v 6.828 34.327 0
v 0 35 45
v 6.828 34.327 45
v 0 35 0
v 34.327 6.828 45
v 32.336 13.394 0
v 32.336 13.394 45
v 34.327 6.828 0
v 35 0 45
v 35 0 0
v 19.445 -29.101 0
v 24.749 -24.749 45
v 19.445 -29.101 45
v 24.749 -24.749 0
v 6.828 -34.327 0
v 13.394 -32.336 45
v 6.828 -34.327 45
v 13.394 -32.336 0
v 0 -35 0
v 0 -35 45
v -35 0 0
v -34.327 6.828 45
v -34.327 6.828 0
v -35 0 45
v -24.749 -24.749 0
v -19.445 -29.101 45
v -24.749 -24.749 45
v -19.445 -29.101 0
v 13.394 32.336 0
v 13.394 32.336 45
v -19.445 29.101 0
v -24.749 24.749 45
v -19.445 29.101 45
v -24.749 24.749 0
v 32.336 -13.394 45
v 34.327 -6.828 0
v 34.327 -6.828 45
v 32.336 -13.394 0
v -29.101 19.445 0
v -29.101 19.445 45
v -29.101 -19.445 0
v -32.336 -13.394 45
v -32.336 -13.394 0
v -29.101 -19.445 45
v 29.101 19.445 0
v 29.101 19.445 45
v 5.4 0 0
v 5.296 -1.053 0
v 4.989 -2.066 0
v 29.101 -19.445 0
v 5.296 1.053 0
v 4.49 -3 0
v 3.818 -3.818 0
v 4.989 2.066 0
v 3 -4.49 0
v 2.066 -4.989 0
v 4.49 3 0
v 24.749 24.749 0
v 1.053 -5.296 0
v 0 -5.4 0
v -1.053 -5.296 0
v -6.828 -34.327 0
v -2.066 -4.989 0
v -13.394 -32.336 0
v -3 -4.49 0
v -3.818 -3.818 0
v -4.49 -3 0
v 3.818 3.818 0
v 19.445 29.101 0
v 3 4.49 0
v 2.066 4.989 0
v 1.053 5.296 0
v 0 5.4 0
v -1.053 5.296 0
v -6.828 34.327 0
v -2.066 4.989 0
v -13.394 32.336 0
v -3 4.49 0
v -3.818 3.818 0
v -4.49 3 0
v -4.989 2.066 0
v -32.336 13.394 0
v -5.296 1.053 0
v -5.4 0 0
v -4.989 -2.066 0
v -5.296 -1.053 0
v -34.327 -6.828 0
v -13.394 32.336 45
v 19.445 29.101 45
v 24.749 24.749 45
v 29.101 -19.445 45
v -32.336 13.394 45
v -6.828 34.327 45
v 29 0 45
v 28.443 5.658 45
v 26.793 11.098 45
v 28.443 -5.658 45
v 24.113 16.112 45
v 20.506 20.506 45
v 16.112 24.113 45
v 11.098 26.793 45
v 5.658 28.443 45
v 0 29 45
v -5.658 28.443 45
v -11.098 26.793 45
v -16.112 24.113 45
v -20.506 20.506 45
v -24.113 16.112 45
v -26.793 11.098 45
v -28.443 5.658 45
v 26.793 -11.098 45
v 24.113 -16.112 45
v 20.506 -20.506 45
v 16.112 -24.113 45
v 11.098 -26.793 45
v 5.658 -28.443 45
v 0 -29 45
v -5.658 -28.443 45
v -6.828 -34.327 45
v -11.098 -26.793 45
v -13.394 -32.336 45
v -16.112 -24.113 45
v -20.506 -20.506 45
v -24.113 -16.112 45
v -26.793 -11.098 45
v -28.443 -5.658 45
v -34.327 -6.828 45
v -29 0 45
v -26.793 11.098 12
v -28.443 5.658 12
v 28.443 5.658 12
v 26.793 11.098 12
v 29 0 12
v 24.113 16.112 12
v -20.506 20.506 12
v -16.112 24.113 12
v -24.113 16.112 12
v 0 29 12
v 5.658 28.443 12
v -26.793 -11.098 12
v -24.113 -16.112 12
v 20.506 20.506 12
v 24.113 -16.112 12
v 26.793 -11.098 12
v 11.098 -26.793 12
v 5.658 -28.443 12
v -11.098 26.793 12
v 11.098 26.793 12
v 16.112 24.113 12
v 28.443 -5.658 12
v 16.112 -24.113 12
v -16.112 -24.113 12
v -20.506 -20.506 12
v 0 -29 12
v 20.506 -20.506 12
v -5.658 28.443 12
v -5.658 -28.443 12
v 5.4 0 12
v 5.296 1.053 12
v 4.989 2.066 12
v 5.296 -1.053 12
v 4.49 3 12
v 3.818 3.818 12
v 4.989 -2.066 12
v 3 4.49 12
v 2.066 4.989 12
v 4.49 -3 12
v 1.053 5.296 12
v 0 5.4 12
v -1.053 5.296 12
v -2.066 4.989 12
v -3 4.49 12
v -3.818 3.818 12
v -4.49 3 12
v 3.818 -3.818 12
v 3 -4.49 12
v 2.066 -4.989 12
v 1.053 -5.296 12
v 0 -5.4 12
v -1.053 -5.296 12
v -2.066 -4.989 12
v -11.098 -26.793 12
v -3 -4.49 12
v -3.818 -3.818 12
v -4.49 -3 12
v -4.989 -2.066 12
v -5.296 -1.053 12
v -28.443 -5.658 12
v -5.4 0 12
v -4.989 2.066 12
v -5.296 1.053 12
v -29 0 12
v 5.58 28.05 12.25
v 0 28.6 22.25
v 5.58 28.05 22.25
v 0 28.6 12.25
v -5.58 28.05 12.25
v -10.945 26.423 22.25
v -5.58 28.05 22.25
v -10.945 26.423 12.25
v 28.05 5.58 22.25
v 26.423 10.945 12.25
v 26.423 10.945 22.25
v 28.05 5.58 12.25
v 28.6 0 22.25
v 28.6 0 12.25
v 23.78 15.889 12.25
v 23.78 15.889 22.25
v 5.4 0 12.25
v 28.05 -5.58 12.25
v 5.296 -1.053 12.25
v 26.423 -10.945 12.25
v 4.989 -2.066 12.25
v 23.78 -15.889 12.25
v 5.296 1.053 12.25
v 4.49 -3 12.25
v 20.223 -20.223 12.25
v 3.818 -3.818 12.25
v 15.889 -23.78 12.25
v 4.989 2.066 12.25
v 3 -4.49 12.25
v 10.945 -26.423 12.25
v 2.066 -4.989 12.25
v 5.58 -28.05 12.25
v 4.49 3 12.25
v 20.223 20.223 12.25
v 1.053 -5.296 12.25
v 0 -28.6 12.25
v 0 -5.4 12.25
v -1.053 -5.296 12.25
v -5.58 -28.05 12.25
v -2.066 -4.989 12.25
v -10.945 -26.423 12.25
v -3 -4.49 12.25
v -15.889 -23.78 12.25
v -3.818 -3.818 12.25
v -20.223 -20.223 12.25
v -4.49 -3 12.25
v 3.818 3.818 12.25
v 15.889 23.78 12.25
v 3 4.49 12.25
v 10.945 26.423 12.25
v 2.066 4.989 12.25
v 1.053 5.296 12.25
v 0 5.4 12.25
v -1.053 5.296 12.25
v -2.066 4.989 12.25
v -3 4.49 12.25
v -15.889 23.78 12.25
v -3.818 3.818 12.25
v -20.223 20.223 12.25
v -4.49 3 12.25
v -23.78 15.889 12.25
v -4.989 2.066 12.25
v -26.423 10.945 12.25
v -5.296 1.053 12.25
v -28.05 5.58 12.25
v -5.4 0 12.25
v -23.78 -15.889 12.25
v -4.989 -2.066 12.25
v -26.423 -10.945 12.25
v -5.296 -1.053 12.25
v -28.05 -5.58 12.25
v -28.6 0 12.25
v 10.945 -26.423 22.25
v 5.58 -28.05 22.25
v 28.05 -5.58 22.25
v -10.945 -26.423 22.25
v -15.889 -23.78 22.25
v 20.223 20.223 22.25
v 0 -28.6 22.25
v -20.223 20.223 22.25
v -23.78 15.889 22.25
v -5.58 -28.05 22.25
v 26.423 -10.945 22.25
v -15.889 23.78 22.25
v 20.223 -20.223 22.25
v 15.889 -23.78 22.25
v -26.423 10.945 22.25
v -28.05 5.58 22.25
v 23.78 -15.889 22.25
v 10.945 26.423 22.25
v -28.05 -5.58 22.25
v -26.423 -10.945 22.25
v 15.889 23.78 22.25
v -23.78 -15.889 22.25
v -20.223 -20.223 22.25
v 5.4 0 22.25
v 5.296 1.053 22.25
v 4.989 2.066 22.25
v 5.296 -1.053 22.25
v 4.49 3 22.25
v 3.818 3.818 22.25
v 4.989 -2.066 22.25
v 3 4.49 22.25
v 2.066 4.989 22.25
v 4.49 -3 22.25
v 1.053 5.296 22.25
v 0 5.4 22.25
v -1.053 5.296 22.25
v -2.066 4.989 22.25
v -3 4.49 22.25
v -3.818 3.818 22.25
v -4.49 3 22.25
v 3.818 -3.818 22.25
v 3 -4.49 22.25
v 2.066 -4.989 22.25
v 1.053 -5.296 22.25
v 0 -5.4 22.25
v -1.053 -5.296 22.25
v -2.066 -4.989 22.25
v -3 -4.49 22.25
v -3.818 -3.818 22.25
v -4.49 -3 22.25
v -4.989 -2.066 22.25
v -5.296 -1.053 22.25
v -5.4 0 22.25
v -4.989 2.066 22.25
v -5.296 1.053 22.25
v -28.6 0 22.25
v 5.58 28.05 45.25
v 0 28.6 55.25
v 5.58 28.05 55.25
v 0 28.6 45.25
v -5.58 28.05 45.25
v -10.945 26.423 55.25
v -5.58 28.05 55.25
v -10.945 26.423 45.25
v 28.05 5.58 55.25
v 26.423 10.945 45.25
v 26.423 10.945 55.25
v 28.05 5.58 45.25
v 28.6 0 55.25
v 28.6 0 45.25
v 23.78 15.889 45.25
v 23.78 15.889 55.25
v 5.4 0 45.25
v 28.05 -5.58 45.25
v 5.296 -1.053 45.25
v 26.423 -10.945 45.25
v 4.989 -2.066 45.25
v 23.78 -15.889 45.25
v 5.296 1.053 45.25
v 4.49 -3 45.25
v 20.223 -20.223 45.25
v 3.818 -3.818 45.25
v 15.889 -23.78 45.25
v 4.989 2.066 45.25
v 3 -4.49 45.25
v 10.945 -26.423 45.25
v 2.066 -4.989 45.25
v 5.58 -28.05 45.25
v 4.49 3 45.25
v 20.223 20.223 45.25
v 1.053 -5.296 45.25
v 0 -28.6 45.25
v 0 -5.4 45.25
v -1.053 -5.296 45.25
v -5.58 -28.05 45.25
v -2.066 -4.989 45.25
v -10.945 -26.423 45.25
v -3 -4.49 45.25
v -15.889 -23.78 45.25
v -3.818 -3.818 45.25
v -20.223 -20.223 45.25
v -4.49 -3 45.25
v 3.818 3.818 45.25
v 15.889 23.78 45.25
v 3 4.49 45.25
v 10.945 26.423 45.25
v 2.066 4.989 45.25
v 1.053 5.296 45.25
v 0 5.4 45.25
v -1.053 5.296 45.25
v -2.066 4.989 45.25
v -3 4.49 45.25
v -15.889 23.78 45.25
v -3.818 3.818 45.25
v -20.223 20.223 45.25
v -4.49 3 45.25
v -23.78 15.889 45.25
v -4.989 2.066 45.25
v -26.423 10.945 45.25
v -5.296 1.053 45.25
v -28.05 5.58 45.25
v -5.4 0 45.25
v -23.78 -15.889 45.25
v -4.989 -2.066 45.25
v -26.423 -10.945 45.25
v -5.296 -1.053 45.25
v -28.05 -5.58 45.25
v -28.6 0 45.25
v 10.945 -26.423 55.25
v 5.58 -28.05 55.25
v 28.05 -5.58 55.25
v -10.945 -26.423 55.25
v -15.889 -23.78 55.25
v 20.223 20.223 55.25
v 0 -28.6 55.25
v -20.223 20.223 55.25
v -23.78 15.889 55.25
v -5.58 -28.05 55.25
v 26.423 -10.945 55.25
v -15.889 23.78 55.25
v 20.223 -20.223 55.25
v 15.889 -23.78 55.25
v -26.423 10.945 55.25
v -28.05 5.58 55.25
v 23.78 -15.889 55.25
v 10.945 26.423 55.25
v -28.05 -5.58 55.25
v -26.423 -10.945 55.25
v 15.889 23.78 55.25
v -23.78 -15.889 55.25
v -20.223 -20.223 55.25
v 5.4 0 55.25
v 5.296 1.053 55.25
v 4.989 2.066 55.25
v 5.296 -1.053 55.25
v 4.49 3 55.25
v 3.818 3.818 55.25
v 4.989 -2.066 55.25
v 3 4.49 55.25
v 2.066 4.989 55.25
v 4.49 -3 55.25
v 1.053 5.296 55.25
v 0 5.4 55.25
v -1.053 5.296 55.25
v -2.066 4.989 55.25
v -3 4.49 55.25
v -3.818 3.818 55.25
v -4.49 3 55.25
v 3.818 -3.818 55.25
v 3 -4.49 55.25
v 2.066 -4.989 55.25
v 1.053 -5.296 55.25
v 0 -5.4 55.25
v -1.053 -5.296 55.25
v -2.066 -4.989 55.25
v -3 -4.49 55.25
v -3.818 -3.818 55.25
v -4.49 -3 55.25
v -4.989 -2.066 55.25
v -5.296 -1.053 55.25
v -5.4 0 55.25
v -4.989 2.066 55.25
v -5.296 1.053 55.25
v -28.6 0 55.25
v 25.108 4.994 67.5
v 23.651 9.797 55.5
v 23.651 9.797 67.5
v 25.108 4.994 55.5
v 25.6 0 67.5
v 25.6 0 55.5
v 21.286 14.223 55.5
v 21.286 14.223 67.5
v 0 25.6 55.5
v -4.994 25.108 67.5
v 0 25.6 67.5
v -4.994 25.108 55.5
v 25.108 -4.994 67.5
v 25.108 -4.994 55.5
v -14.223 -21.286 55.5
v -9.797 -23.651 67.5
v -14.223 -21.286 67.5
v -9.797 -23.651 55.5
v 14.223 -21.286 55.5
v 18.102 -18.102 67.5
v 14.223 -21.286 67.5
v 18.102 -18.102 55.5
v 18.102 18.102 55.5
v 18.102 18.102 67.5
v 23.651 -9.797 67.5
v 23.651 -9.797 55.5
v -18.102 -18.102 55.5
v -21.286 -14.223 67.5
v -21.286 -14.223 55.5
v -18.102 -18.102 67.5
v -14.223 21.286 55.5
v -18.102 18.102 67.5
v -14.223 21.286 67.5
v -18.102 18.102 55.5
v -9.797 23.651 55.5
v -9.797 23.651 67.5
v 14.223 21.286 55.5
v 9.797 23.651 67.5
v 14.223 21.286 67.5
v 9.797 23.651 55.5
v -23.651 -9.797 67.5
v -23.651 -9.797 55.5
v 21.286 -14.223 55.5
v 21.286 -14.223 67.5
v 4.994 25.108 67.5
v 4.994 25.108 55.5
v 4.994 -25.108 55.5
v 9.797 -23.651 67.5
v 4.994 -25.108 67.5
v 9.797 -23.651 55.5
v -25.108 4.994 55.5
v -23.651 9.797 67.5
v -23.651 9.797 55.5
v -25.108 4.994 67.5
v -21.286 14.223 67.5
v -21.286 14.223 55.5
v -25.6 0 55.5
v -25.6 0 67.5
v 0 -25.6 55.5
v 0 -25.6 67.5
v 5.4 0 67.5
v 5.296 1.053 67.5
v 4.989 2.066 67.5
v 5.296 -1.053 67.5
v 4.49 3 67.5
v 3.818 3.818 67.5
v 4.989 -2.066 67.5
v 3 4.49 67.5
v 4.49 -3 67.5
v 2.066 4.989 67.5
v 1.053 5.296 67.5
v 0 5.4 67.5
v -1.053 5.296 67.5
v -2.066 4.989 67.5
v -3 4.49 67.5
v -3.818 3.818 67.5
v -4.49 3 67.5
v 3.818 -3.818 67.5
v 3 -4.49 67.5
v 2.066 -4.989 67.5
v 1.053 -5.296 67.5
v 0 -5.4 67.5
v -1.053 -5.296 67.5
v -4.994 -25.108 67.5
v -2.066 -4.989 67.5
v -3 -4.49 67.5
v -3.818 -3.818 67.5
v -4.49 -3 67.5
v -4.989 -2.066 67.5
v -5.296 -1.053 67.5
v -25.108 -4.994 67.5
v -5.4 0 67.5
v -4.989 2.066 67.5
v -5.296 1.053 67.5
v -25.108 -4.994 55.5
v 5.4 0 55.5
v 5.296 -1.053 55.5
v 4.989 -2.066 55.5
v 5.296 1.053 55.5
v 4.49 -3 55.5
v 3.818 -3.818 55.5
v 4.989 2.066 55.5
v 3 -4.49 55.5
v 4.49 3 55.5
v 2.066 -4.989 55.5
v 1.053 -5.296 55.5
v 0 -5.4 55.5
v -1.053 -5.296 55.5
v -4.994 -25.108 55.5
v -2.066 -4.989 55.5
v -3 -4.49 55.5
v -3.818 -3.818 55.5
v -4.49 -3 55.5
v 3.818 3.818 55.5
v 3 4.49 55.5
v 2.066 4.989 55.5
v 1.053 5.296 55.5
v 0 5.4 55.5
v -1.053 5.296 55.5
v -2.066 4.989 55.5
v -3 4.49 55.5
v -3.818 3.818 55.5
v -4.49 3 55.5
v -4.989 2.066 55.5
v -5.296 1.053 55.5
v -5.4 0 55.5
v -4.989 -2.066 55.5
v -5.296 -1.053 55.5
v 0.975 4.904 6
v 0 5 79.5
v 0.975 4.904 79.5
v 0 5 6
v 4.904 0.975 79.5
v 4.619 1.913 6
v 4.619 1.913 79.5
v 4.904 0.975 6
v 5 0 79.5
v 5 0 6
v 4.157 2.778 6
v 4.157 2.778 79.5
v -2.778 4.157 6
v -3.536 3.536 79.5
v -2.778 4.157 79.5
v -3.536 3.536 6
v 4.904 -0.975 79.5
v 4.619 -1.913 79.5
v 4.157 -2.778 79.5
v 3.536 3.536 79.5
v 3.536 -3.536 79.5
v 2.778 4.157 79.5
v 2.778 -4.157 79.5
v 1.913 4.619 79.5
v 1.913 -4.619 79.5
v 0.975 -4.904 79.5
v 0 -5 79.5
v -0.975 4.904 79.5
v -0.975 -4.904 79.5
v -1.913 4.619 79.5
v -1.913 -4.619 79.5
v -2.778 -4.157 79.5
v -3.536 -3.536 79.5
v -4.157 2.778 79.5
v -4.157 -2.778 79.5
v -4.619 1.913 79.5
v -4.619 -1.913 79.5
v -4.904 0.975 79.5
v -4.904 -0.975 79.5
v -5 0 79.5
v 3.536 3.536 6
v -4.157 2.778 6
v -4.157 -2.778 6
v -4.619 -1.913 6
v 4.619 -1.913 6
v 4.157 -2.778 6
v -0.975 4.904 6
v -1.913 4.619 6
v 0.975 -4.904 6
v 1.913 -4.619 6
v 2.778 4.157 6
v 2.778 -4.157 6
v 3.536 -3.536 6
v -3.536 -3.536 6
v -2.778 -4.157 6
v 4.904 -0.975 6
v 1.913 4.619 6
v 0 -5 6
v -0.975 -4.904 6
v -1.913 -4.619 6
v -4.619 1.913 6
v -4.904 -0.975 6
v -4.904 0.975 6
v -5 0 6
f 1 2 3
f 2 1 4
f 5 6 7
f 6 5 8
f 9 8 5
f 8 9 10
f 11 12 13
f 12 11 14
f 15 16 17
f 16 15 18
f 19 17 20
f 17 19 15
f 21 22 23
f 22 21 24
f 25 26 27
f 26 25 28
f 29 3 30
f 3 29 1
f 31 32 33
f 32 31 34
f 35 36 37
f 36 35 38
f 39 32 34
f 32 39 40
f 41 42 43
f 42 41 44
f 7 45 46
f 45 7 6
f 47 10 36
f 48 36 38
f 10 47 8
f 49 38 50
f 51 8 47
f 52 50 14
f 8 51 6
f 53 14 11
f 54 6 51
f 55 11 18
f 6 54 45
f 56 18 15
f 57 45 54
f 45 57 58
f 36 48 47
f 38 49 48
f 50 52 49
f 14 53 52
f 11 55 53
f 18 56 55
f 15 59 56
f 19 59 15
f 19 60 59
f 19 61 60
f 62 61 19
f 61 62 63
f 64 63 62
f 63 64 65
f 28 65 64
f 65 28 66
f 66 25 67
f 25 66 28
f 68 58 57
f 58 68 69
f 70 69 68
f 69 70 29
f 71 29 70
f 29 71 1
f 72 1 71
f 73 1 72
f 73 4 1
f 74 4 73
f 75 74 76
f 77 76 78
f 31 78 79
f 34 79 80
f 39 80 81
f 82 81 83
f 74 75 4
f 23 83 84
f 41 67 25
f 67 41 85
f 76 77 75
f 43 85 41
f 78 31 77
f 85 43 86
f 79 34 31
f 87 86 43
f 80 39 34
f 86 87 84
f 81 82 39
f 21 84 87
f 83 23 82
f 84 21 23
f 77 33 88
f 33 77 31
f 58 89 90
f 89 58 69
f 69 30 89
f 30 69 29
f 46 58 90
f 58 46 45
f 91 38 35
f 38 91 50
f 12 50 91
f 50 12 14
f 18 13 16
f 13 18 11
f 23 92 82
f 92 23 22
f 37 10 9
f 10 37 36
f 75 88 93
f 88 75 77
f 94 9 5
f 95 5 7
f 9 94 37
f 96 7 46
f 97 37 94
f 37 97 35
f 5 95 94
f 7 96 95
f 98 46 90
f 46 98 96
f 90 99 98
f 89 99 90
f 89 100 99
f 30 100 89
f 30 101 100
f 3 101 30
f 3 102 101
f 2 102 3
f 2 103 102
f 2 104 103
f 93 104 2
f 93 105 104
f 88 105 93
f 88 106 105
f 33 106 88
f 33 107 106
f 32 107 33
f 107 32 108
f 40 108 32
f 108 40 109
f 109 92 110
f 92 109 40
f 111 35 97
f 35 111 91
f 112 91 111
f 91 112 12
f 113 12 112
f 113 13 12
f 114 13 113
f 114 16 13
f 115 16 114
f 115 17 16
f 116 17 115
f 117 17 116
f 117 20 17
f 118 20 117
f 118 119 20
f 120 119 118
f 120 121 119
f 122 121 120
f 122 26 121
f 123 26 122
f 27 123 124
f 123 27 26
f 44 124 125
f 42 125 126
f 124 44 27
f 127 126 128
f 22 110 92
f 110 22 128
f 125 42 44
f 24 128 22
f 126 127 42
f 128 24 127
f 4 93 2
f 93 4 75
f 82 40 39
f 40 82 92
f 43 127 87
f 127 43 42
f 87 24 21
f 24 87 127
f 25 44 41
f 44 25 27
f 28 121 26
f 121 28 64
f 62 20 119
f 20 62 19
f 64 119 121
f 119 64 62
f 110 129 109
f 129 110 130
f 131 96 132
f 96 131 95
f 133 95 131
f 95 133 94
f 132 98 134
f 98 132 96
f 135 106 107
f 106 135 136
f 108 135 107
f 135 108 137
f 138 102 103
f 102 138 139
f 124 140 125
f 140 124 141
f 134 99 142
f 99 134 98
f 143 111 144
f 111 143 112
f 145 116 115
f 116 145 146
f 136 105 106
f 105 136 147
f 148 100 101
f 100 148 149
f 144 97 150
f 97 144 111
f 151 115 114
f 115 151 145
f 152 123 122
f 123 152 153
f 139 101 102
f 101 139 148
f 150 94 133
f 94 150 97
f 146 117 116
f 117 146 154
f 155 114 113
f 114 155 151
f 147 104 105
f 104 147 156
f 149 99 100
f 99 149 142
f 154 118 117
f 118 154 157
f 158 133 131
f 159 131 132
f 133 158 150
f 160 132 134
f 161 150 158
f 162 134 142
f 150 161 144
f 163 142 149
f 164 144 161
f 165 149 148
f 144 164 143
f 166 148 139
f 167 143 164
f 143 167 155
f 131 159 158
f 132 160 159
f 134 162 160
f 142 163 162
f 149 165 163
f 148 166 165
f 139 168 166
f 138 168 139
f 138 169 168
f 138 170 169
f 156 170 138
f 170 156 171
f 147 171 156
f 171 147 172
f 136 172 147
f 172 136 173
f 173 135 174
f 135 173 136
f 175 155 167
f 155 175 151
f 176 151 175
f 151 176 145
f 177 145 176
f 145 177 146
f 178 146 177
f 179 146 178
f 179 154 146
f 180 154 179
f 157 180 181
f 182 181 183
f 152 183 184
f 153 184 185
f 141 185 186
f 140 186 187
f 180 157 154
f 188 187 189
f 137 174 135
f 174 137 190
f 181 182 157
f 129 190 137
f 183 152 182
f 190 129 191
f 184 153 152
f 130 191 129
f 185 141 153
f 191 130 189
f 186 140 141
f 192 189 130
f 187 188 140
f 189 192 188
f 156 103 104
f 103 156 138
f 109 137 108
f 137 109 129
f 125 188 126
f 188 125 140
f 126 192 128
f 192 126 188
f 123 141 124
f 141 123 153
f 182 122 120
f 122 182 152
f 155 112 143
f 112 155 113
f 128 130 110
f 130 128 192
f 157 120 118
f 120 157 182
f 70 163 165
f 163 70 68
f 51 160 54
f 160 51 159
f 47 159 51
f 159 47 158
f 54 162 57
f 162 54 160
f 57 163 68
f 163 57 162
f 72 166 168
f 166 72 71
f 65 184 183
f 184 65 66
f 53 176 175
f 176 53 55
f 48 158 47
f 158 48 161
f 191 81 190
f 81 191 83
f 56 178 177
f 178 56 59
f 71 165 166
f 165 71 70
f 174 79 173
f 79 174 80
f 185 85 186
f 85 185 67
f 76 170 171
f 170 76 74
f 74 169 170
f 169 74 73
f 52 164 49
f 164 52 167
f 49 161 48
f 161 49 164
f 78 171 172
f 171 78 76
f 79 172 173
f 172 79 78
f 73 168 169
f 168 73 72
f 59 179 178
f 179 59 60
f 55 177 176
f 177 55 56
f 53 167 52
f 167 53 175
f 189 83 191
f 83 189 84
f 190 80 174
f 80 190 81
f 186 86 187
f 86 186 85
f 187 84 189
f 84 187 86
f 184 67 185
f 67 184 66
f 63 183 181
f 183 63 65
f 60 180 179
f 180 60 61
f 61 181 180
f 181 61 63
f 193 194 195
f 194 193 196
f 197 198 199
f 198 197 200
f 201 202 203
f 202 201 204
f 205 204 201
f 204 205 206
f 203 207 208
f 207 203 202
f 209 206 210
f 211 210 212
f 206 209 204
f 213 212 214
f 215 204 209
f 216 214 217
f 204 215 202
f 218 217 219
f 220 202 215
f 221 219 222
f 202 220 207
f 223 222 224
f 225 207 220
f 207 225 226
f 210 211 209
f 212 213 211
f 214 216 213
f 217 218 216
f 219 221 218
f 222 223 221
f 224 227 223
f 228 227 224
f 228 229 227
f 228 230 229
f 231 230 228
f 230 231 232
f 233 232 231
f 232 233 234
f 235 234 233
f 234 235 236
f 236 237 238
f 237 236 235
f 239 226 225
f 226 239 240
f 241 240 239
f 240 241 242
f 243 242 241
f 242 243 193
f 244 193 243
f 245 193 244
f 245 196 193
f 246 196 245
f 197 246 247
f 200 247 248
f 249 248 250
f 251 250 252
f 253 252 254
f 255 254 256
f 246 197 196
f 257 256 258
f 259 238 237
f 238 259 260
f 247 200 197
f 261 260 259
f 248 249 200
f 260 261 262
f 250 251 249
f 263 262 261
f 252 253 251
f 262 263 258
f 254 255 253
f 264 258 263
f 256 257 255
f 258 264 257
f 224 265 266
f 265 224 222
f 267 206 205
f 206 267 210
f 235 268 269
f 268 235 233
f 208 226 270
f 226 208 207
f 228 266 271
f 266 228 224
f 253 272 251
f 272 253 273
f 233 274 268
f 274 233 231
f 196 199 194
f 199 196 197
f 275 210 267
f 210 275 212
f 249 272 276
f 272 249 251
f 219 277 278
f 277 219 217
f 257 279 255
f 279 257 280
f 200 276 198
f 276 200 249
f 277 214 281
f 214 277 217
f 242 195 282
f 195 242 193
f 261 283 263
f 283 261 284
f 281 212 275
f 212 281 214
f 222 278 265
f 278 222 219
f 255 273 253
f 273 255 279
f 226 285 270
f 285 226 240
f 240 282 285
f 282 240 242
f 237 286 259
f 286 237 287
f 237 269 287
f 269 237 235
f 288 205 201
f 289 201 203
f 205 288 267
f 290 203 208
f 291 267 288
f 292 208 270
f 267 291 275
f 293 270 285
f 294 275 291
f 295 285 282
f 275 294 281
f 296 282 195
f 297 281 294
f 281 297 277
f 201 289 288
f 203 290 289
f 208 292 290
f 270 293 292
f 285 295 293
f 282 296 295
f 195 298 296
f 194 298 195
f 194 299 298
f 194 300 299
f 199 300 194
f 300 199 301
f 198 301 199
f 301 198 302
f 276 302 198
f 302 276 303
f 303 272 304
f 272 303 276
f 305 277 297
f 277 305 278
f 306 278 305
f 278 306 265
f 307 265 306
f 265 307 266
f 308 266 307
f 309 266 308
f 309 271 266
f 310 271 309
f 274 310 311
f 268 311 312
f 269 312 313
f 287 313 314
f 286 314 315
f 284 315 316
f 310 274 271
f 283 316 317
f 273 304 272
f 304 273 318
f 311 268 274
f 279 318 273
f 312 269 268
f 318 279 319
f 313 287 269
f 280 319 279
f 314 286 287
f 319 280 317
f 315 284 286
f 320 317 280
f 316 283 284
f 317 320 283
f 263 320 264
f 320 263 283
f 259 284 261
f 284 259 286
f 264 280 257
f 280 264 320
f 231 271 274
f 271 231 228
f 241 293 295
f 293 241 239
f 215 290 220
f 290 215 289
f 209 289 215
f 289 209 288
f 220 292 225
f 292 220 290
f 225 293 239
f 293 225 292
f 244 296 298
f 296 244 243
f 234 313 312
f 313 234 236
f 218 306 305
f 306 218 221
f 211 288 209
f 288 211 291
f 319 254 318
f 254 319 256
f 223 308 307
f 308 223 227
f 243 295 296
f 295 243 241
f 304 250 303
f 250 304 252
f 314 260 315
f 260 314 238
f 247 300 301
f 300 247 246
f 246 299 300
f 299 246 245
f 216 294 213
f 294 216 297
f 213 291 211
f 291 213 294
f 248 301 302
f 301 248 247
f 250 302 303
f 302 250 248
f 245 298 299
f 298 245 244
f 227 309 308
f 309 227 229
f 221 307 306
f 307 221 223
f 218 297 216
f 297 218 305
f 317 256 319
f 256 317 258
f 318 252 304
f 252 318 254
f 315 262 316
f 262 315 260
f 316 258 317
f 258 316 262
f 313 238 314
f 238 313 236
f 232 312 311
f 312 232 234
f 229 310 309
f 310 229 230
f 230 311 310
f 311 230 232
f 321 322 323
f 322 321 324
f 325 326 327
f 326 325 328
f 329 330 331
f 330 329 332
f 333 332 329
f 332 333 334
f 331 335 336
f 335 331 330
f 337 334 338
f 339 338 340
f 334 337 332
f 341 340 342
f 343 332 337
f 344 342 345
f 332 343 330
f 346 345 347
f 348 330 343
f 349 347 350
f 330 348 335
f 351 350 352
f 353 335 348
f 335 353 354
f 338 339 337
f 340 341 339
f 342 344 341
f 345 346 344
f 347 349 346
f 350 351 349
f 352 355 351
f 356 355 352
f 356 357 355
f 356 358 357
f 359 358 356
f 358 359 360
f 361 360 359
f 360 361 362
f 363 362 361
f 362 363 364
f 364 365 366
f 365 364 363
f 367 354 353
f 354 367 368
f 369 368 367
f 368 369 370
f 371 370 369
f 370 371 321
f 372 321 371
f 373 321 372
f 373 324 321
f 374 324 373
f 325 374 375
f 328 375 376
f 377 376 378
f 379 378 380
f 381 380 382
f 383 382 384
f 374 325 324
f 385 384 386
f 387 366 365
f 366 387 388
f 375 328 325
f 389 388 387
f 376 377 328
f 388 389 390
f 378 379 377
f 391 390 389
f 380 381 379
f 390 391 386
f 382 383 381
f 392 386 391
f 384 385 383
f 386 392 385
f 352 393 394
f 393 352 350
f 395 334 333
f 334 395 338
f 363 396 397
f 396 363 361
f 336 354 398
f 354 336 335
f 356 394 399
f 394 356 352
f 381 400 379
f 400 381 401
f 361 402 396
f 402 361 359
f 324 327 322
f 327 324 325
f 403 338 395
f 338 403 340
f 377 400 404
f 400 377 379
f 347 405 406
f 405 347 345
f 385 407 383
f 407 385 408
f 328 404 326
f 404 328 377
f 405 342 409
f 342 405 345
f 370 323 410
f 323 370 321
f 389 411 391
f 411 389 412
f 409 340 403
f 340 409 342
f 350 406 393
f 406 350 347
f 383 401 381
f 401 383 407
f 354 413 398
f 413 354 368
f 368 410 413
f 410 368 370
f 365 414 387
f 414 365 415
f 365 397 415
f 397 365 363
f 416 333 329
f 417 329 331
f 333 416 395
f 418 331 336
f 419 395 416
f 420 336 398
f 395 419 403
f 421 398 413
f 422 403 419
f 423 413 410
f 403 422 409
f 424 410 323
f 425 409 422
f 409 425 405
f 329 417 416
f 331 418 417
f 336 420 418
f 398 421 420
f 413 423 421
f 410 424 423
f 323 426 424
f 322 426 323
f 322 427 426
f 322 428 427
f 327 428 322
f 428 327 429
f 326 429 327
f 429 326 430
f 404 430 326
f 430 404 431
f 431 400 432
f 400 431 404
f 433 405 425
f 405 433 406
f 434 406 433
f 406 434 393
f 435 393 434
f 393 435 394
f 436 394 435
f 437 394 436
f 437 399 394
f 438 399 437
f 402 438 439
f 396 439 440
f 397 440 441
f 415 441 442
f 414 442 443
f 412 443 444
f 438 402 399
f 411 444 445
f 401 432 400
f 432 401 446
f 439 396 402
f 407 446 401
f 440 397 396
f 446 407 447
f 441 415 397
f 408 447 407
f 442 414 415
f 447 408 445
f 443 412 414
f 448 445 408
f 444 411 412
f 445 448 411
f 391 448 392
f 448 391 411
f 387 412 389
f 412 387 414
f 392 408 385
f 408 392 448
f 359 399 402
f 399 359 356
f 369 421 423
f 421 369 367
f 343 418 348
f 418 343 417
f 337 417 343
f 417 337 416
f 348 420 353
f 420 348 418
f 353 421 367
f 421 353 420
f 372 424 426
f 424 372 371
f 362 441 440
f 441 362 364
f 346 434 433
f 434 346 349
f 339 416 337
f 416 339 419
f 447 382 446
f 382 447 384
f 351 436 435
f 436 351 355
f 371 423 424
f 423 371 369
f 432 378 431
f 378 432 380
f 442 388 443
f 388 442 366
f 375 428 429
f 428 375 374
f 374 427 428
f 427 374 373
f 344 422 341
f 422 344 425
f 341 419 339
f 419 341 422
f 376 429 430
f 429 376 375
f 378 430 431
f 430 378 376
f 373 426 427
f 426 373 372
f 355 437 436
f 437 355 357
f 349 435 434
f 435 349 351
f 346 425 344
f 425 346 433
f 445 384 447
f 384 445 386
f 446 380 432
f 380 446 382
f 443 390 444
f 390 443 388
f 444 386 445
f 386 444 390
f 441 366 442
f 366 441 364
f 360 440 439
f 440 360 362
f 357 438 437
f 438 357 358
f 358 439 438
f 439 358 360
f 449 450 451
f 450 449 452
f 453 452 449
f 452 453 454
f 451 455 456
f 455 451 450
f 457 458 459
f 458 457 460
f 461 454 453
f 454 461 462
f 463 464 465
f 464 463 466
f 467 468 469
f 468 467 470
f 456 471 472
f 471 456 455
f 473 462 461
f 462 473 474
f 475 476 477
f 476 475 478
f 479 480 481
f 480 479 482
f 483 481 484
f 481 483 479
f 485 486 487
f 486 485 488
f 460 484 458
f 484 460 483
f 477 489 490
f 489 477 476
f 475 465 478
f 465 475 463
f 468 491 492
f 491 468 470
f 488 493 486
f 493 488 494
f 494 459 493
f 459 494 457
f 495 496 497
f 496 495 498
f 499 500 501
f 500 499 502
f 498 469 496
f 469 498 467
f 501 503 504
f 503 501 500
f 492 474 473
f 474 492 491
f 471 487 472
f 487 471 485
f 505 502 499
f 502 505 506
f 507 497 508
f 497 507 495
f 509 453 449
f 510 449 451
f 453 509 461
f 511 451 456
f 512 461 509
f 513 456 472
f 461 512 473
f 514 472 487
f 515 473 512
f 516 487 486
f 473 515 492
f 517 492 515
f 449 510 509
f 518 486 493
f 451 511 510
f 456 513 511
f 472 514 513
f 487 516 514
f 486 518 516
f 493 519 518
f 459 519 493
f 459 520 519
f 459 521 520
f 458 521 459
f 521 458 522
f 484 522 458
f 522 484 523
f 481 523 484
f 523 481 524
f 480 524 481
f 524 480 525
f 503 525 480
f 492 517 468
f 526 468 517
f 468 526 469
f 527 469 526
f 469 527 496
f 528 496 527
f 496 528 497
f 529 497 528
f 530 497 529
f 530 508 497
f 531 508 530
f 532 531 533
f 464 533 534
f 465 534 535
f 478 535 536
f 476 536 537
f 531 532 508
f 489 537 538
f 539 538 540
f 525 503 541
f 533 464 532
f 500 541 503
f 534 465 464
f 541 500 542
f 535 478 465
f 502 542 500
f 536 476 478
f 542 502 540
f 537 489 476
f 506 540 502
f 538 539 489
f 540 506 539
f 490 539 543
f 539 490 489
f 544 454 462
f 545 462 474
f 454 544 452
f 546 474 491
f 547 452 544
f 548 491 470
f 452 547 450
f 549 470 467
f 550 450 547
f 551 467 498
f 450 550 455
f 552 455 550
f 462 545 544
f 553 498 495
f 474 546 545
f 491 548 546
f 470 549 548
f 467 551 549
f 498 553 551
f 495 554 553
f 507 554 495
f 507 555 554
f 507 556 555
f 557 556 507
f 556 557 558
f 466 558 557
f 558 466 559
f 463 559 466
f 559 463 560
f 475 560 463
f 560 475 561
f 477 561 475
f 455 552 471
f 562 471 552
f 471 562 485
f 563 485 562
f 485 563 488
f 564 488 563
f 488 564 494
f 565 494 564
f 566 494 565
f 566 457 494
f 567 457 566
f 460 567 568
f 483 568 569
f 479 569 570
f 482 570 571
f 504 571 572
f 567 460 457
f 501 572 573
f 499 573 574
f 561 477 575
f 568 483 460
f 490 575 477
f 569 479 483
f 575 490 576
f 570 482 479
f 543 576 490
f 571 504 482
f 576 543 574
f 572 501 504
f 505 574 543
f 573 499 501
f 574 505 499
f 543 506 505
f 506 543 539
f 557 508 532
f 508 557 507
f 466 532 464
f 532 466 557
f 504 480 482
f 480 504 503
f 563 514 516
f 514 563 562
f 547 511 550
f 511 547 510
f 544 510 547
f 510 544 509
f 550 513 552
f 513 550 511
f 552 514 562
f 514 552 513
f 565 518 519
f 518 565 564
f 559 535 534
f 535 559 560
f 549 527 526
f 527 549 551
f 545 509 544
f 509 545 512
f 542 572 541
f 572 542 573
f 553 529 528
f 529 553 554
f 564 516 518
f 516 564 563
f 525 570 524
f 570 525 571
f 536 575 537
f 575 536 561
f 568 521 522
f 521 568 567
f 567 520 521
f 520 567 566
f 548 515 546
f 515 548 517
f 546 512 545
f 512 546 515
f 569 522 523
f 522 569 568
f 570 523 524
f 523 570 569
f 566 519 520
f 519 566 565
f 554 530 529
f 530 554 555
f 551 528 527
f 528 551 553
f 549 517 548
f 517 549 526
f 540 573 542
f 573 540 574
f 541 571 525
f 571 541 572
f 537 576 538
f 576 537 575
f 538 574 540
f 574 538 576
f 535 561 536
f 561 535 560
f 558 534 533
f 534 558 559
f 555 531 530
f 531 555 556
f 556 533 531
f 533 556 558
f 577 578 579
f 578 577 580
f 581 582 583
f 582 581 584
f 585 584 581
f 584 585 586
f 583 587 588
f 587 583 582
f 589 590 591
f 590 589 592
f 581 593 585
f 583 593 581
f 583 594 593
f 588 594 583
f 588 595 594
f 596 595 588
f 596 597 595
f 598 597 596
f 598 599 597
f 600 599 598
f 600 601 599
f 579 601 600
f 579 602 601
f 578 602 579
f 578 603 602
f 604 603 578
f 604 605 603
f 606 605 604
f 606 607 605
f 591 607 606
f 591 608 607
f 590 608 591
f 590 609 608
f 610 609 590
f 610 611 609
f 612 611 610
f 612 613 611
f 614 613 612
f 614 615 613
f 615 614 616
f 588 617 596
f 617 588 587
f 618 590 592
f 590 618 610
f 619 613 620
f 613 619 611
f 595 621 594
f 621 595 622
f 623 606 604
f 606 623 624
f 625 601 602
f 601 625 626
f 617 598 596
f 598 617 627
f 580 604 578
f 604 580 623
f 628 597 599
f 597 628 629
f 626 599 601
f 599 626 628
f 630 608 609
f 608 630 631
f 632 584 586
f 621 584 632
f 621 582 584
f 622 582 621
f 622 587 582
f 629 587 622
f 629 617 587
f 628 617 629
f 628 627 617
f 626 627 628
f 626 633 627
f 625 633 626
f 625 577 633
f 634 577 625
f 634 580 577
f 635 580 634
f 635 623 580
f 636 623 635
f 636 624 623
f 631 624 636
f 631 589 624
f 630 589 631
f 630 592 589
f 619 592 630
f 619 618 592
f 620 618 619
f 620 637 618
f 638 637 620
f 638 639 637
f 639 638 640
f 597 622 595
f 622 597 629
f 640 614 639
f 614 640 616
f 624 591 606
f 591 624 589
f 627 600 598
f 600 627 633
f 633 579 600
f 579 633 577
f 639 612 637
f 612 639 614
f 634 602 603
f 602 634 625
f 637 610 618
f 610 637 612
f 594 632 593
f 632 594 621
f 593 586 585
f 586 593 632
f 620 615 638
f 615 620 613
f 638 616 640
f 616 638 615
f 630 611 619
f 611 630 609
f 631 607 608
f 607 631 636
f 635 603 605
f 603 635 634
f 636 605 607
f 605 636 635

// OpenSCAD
$fn = 32;

// ------------------------------------------------------------------------
// Bearing housing: housing d70, two bearings and a shaft
// Every part is its own module, assembly() places them once.
// ------------------------------------------------------------------------

// --- part 1 ---
module housing() {
  difference() {
    cylinder(h = 45, d = 70);
    translate([0, 0, 12]) cylinder(h = 34, d = 58);
    translate([0, 0, -1]) cylinder(h = 14, d = 10.8);
  }
}

// --- part 2 ---
module bearing_lower() {
  difference() {
      translate([0, 0, 0]) cylinder(h = 10, d = 57.2);
      translate([0, 0, -1]) cylinder(h = 12, d = 10.8);
    }
}

// --- part 3 ---
module bearing_upper() {
  difference() {
      translate([0, 0, 0]) cylinder(h = 10, d = 57.2);
      translate([0, 0, -1]) cylinder(h = 12, d = 10.8);
    }
}

// --- part 4 ---
module spacer() {
  difference() {
      translate([0, 0, 0]) cylinder(h = 12, d = 51.2);
      translate([0, 0, -1]) cylinder(h = 14, d = 10.8);
    }
}

// --- part 5 ---
module shaft() {
  translate([0, 0, -36.75]) cylinder(h = 73.5, d = 10);
}

// --- assembly ---
module assembly() {
  translate([0, 0, 0]) rotate([0, 0, 0]) housing();
  translate([0, 0, 12.25]) rotate([0, 0, 0]) bearing_lower();
  translate([0, 0, 45.25]) rotate([0, 0, 0]) bearing_upper();
  translate([0, 0, 55.5]) rotate([0, 0, 0]) spacer();
  translate([0, 0, 42.75]) rotate([0, 0, 0]) shaft();
}

assembly();
